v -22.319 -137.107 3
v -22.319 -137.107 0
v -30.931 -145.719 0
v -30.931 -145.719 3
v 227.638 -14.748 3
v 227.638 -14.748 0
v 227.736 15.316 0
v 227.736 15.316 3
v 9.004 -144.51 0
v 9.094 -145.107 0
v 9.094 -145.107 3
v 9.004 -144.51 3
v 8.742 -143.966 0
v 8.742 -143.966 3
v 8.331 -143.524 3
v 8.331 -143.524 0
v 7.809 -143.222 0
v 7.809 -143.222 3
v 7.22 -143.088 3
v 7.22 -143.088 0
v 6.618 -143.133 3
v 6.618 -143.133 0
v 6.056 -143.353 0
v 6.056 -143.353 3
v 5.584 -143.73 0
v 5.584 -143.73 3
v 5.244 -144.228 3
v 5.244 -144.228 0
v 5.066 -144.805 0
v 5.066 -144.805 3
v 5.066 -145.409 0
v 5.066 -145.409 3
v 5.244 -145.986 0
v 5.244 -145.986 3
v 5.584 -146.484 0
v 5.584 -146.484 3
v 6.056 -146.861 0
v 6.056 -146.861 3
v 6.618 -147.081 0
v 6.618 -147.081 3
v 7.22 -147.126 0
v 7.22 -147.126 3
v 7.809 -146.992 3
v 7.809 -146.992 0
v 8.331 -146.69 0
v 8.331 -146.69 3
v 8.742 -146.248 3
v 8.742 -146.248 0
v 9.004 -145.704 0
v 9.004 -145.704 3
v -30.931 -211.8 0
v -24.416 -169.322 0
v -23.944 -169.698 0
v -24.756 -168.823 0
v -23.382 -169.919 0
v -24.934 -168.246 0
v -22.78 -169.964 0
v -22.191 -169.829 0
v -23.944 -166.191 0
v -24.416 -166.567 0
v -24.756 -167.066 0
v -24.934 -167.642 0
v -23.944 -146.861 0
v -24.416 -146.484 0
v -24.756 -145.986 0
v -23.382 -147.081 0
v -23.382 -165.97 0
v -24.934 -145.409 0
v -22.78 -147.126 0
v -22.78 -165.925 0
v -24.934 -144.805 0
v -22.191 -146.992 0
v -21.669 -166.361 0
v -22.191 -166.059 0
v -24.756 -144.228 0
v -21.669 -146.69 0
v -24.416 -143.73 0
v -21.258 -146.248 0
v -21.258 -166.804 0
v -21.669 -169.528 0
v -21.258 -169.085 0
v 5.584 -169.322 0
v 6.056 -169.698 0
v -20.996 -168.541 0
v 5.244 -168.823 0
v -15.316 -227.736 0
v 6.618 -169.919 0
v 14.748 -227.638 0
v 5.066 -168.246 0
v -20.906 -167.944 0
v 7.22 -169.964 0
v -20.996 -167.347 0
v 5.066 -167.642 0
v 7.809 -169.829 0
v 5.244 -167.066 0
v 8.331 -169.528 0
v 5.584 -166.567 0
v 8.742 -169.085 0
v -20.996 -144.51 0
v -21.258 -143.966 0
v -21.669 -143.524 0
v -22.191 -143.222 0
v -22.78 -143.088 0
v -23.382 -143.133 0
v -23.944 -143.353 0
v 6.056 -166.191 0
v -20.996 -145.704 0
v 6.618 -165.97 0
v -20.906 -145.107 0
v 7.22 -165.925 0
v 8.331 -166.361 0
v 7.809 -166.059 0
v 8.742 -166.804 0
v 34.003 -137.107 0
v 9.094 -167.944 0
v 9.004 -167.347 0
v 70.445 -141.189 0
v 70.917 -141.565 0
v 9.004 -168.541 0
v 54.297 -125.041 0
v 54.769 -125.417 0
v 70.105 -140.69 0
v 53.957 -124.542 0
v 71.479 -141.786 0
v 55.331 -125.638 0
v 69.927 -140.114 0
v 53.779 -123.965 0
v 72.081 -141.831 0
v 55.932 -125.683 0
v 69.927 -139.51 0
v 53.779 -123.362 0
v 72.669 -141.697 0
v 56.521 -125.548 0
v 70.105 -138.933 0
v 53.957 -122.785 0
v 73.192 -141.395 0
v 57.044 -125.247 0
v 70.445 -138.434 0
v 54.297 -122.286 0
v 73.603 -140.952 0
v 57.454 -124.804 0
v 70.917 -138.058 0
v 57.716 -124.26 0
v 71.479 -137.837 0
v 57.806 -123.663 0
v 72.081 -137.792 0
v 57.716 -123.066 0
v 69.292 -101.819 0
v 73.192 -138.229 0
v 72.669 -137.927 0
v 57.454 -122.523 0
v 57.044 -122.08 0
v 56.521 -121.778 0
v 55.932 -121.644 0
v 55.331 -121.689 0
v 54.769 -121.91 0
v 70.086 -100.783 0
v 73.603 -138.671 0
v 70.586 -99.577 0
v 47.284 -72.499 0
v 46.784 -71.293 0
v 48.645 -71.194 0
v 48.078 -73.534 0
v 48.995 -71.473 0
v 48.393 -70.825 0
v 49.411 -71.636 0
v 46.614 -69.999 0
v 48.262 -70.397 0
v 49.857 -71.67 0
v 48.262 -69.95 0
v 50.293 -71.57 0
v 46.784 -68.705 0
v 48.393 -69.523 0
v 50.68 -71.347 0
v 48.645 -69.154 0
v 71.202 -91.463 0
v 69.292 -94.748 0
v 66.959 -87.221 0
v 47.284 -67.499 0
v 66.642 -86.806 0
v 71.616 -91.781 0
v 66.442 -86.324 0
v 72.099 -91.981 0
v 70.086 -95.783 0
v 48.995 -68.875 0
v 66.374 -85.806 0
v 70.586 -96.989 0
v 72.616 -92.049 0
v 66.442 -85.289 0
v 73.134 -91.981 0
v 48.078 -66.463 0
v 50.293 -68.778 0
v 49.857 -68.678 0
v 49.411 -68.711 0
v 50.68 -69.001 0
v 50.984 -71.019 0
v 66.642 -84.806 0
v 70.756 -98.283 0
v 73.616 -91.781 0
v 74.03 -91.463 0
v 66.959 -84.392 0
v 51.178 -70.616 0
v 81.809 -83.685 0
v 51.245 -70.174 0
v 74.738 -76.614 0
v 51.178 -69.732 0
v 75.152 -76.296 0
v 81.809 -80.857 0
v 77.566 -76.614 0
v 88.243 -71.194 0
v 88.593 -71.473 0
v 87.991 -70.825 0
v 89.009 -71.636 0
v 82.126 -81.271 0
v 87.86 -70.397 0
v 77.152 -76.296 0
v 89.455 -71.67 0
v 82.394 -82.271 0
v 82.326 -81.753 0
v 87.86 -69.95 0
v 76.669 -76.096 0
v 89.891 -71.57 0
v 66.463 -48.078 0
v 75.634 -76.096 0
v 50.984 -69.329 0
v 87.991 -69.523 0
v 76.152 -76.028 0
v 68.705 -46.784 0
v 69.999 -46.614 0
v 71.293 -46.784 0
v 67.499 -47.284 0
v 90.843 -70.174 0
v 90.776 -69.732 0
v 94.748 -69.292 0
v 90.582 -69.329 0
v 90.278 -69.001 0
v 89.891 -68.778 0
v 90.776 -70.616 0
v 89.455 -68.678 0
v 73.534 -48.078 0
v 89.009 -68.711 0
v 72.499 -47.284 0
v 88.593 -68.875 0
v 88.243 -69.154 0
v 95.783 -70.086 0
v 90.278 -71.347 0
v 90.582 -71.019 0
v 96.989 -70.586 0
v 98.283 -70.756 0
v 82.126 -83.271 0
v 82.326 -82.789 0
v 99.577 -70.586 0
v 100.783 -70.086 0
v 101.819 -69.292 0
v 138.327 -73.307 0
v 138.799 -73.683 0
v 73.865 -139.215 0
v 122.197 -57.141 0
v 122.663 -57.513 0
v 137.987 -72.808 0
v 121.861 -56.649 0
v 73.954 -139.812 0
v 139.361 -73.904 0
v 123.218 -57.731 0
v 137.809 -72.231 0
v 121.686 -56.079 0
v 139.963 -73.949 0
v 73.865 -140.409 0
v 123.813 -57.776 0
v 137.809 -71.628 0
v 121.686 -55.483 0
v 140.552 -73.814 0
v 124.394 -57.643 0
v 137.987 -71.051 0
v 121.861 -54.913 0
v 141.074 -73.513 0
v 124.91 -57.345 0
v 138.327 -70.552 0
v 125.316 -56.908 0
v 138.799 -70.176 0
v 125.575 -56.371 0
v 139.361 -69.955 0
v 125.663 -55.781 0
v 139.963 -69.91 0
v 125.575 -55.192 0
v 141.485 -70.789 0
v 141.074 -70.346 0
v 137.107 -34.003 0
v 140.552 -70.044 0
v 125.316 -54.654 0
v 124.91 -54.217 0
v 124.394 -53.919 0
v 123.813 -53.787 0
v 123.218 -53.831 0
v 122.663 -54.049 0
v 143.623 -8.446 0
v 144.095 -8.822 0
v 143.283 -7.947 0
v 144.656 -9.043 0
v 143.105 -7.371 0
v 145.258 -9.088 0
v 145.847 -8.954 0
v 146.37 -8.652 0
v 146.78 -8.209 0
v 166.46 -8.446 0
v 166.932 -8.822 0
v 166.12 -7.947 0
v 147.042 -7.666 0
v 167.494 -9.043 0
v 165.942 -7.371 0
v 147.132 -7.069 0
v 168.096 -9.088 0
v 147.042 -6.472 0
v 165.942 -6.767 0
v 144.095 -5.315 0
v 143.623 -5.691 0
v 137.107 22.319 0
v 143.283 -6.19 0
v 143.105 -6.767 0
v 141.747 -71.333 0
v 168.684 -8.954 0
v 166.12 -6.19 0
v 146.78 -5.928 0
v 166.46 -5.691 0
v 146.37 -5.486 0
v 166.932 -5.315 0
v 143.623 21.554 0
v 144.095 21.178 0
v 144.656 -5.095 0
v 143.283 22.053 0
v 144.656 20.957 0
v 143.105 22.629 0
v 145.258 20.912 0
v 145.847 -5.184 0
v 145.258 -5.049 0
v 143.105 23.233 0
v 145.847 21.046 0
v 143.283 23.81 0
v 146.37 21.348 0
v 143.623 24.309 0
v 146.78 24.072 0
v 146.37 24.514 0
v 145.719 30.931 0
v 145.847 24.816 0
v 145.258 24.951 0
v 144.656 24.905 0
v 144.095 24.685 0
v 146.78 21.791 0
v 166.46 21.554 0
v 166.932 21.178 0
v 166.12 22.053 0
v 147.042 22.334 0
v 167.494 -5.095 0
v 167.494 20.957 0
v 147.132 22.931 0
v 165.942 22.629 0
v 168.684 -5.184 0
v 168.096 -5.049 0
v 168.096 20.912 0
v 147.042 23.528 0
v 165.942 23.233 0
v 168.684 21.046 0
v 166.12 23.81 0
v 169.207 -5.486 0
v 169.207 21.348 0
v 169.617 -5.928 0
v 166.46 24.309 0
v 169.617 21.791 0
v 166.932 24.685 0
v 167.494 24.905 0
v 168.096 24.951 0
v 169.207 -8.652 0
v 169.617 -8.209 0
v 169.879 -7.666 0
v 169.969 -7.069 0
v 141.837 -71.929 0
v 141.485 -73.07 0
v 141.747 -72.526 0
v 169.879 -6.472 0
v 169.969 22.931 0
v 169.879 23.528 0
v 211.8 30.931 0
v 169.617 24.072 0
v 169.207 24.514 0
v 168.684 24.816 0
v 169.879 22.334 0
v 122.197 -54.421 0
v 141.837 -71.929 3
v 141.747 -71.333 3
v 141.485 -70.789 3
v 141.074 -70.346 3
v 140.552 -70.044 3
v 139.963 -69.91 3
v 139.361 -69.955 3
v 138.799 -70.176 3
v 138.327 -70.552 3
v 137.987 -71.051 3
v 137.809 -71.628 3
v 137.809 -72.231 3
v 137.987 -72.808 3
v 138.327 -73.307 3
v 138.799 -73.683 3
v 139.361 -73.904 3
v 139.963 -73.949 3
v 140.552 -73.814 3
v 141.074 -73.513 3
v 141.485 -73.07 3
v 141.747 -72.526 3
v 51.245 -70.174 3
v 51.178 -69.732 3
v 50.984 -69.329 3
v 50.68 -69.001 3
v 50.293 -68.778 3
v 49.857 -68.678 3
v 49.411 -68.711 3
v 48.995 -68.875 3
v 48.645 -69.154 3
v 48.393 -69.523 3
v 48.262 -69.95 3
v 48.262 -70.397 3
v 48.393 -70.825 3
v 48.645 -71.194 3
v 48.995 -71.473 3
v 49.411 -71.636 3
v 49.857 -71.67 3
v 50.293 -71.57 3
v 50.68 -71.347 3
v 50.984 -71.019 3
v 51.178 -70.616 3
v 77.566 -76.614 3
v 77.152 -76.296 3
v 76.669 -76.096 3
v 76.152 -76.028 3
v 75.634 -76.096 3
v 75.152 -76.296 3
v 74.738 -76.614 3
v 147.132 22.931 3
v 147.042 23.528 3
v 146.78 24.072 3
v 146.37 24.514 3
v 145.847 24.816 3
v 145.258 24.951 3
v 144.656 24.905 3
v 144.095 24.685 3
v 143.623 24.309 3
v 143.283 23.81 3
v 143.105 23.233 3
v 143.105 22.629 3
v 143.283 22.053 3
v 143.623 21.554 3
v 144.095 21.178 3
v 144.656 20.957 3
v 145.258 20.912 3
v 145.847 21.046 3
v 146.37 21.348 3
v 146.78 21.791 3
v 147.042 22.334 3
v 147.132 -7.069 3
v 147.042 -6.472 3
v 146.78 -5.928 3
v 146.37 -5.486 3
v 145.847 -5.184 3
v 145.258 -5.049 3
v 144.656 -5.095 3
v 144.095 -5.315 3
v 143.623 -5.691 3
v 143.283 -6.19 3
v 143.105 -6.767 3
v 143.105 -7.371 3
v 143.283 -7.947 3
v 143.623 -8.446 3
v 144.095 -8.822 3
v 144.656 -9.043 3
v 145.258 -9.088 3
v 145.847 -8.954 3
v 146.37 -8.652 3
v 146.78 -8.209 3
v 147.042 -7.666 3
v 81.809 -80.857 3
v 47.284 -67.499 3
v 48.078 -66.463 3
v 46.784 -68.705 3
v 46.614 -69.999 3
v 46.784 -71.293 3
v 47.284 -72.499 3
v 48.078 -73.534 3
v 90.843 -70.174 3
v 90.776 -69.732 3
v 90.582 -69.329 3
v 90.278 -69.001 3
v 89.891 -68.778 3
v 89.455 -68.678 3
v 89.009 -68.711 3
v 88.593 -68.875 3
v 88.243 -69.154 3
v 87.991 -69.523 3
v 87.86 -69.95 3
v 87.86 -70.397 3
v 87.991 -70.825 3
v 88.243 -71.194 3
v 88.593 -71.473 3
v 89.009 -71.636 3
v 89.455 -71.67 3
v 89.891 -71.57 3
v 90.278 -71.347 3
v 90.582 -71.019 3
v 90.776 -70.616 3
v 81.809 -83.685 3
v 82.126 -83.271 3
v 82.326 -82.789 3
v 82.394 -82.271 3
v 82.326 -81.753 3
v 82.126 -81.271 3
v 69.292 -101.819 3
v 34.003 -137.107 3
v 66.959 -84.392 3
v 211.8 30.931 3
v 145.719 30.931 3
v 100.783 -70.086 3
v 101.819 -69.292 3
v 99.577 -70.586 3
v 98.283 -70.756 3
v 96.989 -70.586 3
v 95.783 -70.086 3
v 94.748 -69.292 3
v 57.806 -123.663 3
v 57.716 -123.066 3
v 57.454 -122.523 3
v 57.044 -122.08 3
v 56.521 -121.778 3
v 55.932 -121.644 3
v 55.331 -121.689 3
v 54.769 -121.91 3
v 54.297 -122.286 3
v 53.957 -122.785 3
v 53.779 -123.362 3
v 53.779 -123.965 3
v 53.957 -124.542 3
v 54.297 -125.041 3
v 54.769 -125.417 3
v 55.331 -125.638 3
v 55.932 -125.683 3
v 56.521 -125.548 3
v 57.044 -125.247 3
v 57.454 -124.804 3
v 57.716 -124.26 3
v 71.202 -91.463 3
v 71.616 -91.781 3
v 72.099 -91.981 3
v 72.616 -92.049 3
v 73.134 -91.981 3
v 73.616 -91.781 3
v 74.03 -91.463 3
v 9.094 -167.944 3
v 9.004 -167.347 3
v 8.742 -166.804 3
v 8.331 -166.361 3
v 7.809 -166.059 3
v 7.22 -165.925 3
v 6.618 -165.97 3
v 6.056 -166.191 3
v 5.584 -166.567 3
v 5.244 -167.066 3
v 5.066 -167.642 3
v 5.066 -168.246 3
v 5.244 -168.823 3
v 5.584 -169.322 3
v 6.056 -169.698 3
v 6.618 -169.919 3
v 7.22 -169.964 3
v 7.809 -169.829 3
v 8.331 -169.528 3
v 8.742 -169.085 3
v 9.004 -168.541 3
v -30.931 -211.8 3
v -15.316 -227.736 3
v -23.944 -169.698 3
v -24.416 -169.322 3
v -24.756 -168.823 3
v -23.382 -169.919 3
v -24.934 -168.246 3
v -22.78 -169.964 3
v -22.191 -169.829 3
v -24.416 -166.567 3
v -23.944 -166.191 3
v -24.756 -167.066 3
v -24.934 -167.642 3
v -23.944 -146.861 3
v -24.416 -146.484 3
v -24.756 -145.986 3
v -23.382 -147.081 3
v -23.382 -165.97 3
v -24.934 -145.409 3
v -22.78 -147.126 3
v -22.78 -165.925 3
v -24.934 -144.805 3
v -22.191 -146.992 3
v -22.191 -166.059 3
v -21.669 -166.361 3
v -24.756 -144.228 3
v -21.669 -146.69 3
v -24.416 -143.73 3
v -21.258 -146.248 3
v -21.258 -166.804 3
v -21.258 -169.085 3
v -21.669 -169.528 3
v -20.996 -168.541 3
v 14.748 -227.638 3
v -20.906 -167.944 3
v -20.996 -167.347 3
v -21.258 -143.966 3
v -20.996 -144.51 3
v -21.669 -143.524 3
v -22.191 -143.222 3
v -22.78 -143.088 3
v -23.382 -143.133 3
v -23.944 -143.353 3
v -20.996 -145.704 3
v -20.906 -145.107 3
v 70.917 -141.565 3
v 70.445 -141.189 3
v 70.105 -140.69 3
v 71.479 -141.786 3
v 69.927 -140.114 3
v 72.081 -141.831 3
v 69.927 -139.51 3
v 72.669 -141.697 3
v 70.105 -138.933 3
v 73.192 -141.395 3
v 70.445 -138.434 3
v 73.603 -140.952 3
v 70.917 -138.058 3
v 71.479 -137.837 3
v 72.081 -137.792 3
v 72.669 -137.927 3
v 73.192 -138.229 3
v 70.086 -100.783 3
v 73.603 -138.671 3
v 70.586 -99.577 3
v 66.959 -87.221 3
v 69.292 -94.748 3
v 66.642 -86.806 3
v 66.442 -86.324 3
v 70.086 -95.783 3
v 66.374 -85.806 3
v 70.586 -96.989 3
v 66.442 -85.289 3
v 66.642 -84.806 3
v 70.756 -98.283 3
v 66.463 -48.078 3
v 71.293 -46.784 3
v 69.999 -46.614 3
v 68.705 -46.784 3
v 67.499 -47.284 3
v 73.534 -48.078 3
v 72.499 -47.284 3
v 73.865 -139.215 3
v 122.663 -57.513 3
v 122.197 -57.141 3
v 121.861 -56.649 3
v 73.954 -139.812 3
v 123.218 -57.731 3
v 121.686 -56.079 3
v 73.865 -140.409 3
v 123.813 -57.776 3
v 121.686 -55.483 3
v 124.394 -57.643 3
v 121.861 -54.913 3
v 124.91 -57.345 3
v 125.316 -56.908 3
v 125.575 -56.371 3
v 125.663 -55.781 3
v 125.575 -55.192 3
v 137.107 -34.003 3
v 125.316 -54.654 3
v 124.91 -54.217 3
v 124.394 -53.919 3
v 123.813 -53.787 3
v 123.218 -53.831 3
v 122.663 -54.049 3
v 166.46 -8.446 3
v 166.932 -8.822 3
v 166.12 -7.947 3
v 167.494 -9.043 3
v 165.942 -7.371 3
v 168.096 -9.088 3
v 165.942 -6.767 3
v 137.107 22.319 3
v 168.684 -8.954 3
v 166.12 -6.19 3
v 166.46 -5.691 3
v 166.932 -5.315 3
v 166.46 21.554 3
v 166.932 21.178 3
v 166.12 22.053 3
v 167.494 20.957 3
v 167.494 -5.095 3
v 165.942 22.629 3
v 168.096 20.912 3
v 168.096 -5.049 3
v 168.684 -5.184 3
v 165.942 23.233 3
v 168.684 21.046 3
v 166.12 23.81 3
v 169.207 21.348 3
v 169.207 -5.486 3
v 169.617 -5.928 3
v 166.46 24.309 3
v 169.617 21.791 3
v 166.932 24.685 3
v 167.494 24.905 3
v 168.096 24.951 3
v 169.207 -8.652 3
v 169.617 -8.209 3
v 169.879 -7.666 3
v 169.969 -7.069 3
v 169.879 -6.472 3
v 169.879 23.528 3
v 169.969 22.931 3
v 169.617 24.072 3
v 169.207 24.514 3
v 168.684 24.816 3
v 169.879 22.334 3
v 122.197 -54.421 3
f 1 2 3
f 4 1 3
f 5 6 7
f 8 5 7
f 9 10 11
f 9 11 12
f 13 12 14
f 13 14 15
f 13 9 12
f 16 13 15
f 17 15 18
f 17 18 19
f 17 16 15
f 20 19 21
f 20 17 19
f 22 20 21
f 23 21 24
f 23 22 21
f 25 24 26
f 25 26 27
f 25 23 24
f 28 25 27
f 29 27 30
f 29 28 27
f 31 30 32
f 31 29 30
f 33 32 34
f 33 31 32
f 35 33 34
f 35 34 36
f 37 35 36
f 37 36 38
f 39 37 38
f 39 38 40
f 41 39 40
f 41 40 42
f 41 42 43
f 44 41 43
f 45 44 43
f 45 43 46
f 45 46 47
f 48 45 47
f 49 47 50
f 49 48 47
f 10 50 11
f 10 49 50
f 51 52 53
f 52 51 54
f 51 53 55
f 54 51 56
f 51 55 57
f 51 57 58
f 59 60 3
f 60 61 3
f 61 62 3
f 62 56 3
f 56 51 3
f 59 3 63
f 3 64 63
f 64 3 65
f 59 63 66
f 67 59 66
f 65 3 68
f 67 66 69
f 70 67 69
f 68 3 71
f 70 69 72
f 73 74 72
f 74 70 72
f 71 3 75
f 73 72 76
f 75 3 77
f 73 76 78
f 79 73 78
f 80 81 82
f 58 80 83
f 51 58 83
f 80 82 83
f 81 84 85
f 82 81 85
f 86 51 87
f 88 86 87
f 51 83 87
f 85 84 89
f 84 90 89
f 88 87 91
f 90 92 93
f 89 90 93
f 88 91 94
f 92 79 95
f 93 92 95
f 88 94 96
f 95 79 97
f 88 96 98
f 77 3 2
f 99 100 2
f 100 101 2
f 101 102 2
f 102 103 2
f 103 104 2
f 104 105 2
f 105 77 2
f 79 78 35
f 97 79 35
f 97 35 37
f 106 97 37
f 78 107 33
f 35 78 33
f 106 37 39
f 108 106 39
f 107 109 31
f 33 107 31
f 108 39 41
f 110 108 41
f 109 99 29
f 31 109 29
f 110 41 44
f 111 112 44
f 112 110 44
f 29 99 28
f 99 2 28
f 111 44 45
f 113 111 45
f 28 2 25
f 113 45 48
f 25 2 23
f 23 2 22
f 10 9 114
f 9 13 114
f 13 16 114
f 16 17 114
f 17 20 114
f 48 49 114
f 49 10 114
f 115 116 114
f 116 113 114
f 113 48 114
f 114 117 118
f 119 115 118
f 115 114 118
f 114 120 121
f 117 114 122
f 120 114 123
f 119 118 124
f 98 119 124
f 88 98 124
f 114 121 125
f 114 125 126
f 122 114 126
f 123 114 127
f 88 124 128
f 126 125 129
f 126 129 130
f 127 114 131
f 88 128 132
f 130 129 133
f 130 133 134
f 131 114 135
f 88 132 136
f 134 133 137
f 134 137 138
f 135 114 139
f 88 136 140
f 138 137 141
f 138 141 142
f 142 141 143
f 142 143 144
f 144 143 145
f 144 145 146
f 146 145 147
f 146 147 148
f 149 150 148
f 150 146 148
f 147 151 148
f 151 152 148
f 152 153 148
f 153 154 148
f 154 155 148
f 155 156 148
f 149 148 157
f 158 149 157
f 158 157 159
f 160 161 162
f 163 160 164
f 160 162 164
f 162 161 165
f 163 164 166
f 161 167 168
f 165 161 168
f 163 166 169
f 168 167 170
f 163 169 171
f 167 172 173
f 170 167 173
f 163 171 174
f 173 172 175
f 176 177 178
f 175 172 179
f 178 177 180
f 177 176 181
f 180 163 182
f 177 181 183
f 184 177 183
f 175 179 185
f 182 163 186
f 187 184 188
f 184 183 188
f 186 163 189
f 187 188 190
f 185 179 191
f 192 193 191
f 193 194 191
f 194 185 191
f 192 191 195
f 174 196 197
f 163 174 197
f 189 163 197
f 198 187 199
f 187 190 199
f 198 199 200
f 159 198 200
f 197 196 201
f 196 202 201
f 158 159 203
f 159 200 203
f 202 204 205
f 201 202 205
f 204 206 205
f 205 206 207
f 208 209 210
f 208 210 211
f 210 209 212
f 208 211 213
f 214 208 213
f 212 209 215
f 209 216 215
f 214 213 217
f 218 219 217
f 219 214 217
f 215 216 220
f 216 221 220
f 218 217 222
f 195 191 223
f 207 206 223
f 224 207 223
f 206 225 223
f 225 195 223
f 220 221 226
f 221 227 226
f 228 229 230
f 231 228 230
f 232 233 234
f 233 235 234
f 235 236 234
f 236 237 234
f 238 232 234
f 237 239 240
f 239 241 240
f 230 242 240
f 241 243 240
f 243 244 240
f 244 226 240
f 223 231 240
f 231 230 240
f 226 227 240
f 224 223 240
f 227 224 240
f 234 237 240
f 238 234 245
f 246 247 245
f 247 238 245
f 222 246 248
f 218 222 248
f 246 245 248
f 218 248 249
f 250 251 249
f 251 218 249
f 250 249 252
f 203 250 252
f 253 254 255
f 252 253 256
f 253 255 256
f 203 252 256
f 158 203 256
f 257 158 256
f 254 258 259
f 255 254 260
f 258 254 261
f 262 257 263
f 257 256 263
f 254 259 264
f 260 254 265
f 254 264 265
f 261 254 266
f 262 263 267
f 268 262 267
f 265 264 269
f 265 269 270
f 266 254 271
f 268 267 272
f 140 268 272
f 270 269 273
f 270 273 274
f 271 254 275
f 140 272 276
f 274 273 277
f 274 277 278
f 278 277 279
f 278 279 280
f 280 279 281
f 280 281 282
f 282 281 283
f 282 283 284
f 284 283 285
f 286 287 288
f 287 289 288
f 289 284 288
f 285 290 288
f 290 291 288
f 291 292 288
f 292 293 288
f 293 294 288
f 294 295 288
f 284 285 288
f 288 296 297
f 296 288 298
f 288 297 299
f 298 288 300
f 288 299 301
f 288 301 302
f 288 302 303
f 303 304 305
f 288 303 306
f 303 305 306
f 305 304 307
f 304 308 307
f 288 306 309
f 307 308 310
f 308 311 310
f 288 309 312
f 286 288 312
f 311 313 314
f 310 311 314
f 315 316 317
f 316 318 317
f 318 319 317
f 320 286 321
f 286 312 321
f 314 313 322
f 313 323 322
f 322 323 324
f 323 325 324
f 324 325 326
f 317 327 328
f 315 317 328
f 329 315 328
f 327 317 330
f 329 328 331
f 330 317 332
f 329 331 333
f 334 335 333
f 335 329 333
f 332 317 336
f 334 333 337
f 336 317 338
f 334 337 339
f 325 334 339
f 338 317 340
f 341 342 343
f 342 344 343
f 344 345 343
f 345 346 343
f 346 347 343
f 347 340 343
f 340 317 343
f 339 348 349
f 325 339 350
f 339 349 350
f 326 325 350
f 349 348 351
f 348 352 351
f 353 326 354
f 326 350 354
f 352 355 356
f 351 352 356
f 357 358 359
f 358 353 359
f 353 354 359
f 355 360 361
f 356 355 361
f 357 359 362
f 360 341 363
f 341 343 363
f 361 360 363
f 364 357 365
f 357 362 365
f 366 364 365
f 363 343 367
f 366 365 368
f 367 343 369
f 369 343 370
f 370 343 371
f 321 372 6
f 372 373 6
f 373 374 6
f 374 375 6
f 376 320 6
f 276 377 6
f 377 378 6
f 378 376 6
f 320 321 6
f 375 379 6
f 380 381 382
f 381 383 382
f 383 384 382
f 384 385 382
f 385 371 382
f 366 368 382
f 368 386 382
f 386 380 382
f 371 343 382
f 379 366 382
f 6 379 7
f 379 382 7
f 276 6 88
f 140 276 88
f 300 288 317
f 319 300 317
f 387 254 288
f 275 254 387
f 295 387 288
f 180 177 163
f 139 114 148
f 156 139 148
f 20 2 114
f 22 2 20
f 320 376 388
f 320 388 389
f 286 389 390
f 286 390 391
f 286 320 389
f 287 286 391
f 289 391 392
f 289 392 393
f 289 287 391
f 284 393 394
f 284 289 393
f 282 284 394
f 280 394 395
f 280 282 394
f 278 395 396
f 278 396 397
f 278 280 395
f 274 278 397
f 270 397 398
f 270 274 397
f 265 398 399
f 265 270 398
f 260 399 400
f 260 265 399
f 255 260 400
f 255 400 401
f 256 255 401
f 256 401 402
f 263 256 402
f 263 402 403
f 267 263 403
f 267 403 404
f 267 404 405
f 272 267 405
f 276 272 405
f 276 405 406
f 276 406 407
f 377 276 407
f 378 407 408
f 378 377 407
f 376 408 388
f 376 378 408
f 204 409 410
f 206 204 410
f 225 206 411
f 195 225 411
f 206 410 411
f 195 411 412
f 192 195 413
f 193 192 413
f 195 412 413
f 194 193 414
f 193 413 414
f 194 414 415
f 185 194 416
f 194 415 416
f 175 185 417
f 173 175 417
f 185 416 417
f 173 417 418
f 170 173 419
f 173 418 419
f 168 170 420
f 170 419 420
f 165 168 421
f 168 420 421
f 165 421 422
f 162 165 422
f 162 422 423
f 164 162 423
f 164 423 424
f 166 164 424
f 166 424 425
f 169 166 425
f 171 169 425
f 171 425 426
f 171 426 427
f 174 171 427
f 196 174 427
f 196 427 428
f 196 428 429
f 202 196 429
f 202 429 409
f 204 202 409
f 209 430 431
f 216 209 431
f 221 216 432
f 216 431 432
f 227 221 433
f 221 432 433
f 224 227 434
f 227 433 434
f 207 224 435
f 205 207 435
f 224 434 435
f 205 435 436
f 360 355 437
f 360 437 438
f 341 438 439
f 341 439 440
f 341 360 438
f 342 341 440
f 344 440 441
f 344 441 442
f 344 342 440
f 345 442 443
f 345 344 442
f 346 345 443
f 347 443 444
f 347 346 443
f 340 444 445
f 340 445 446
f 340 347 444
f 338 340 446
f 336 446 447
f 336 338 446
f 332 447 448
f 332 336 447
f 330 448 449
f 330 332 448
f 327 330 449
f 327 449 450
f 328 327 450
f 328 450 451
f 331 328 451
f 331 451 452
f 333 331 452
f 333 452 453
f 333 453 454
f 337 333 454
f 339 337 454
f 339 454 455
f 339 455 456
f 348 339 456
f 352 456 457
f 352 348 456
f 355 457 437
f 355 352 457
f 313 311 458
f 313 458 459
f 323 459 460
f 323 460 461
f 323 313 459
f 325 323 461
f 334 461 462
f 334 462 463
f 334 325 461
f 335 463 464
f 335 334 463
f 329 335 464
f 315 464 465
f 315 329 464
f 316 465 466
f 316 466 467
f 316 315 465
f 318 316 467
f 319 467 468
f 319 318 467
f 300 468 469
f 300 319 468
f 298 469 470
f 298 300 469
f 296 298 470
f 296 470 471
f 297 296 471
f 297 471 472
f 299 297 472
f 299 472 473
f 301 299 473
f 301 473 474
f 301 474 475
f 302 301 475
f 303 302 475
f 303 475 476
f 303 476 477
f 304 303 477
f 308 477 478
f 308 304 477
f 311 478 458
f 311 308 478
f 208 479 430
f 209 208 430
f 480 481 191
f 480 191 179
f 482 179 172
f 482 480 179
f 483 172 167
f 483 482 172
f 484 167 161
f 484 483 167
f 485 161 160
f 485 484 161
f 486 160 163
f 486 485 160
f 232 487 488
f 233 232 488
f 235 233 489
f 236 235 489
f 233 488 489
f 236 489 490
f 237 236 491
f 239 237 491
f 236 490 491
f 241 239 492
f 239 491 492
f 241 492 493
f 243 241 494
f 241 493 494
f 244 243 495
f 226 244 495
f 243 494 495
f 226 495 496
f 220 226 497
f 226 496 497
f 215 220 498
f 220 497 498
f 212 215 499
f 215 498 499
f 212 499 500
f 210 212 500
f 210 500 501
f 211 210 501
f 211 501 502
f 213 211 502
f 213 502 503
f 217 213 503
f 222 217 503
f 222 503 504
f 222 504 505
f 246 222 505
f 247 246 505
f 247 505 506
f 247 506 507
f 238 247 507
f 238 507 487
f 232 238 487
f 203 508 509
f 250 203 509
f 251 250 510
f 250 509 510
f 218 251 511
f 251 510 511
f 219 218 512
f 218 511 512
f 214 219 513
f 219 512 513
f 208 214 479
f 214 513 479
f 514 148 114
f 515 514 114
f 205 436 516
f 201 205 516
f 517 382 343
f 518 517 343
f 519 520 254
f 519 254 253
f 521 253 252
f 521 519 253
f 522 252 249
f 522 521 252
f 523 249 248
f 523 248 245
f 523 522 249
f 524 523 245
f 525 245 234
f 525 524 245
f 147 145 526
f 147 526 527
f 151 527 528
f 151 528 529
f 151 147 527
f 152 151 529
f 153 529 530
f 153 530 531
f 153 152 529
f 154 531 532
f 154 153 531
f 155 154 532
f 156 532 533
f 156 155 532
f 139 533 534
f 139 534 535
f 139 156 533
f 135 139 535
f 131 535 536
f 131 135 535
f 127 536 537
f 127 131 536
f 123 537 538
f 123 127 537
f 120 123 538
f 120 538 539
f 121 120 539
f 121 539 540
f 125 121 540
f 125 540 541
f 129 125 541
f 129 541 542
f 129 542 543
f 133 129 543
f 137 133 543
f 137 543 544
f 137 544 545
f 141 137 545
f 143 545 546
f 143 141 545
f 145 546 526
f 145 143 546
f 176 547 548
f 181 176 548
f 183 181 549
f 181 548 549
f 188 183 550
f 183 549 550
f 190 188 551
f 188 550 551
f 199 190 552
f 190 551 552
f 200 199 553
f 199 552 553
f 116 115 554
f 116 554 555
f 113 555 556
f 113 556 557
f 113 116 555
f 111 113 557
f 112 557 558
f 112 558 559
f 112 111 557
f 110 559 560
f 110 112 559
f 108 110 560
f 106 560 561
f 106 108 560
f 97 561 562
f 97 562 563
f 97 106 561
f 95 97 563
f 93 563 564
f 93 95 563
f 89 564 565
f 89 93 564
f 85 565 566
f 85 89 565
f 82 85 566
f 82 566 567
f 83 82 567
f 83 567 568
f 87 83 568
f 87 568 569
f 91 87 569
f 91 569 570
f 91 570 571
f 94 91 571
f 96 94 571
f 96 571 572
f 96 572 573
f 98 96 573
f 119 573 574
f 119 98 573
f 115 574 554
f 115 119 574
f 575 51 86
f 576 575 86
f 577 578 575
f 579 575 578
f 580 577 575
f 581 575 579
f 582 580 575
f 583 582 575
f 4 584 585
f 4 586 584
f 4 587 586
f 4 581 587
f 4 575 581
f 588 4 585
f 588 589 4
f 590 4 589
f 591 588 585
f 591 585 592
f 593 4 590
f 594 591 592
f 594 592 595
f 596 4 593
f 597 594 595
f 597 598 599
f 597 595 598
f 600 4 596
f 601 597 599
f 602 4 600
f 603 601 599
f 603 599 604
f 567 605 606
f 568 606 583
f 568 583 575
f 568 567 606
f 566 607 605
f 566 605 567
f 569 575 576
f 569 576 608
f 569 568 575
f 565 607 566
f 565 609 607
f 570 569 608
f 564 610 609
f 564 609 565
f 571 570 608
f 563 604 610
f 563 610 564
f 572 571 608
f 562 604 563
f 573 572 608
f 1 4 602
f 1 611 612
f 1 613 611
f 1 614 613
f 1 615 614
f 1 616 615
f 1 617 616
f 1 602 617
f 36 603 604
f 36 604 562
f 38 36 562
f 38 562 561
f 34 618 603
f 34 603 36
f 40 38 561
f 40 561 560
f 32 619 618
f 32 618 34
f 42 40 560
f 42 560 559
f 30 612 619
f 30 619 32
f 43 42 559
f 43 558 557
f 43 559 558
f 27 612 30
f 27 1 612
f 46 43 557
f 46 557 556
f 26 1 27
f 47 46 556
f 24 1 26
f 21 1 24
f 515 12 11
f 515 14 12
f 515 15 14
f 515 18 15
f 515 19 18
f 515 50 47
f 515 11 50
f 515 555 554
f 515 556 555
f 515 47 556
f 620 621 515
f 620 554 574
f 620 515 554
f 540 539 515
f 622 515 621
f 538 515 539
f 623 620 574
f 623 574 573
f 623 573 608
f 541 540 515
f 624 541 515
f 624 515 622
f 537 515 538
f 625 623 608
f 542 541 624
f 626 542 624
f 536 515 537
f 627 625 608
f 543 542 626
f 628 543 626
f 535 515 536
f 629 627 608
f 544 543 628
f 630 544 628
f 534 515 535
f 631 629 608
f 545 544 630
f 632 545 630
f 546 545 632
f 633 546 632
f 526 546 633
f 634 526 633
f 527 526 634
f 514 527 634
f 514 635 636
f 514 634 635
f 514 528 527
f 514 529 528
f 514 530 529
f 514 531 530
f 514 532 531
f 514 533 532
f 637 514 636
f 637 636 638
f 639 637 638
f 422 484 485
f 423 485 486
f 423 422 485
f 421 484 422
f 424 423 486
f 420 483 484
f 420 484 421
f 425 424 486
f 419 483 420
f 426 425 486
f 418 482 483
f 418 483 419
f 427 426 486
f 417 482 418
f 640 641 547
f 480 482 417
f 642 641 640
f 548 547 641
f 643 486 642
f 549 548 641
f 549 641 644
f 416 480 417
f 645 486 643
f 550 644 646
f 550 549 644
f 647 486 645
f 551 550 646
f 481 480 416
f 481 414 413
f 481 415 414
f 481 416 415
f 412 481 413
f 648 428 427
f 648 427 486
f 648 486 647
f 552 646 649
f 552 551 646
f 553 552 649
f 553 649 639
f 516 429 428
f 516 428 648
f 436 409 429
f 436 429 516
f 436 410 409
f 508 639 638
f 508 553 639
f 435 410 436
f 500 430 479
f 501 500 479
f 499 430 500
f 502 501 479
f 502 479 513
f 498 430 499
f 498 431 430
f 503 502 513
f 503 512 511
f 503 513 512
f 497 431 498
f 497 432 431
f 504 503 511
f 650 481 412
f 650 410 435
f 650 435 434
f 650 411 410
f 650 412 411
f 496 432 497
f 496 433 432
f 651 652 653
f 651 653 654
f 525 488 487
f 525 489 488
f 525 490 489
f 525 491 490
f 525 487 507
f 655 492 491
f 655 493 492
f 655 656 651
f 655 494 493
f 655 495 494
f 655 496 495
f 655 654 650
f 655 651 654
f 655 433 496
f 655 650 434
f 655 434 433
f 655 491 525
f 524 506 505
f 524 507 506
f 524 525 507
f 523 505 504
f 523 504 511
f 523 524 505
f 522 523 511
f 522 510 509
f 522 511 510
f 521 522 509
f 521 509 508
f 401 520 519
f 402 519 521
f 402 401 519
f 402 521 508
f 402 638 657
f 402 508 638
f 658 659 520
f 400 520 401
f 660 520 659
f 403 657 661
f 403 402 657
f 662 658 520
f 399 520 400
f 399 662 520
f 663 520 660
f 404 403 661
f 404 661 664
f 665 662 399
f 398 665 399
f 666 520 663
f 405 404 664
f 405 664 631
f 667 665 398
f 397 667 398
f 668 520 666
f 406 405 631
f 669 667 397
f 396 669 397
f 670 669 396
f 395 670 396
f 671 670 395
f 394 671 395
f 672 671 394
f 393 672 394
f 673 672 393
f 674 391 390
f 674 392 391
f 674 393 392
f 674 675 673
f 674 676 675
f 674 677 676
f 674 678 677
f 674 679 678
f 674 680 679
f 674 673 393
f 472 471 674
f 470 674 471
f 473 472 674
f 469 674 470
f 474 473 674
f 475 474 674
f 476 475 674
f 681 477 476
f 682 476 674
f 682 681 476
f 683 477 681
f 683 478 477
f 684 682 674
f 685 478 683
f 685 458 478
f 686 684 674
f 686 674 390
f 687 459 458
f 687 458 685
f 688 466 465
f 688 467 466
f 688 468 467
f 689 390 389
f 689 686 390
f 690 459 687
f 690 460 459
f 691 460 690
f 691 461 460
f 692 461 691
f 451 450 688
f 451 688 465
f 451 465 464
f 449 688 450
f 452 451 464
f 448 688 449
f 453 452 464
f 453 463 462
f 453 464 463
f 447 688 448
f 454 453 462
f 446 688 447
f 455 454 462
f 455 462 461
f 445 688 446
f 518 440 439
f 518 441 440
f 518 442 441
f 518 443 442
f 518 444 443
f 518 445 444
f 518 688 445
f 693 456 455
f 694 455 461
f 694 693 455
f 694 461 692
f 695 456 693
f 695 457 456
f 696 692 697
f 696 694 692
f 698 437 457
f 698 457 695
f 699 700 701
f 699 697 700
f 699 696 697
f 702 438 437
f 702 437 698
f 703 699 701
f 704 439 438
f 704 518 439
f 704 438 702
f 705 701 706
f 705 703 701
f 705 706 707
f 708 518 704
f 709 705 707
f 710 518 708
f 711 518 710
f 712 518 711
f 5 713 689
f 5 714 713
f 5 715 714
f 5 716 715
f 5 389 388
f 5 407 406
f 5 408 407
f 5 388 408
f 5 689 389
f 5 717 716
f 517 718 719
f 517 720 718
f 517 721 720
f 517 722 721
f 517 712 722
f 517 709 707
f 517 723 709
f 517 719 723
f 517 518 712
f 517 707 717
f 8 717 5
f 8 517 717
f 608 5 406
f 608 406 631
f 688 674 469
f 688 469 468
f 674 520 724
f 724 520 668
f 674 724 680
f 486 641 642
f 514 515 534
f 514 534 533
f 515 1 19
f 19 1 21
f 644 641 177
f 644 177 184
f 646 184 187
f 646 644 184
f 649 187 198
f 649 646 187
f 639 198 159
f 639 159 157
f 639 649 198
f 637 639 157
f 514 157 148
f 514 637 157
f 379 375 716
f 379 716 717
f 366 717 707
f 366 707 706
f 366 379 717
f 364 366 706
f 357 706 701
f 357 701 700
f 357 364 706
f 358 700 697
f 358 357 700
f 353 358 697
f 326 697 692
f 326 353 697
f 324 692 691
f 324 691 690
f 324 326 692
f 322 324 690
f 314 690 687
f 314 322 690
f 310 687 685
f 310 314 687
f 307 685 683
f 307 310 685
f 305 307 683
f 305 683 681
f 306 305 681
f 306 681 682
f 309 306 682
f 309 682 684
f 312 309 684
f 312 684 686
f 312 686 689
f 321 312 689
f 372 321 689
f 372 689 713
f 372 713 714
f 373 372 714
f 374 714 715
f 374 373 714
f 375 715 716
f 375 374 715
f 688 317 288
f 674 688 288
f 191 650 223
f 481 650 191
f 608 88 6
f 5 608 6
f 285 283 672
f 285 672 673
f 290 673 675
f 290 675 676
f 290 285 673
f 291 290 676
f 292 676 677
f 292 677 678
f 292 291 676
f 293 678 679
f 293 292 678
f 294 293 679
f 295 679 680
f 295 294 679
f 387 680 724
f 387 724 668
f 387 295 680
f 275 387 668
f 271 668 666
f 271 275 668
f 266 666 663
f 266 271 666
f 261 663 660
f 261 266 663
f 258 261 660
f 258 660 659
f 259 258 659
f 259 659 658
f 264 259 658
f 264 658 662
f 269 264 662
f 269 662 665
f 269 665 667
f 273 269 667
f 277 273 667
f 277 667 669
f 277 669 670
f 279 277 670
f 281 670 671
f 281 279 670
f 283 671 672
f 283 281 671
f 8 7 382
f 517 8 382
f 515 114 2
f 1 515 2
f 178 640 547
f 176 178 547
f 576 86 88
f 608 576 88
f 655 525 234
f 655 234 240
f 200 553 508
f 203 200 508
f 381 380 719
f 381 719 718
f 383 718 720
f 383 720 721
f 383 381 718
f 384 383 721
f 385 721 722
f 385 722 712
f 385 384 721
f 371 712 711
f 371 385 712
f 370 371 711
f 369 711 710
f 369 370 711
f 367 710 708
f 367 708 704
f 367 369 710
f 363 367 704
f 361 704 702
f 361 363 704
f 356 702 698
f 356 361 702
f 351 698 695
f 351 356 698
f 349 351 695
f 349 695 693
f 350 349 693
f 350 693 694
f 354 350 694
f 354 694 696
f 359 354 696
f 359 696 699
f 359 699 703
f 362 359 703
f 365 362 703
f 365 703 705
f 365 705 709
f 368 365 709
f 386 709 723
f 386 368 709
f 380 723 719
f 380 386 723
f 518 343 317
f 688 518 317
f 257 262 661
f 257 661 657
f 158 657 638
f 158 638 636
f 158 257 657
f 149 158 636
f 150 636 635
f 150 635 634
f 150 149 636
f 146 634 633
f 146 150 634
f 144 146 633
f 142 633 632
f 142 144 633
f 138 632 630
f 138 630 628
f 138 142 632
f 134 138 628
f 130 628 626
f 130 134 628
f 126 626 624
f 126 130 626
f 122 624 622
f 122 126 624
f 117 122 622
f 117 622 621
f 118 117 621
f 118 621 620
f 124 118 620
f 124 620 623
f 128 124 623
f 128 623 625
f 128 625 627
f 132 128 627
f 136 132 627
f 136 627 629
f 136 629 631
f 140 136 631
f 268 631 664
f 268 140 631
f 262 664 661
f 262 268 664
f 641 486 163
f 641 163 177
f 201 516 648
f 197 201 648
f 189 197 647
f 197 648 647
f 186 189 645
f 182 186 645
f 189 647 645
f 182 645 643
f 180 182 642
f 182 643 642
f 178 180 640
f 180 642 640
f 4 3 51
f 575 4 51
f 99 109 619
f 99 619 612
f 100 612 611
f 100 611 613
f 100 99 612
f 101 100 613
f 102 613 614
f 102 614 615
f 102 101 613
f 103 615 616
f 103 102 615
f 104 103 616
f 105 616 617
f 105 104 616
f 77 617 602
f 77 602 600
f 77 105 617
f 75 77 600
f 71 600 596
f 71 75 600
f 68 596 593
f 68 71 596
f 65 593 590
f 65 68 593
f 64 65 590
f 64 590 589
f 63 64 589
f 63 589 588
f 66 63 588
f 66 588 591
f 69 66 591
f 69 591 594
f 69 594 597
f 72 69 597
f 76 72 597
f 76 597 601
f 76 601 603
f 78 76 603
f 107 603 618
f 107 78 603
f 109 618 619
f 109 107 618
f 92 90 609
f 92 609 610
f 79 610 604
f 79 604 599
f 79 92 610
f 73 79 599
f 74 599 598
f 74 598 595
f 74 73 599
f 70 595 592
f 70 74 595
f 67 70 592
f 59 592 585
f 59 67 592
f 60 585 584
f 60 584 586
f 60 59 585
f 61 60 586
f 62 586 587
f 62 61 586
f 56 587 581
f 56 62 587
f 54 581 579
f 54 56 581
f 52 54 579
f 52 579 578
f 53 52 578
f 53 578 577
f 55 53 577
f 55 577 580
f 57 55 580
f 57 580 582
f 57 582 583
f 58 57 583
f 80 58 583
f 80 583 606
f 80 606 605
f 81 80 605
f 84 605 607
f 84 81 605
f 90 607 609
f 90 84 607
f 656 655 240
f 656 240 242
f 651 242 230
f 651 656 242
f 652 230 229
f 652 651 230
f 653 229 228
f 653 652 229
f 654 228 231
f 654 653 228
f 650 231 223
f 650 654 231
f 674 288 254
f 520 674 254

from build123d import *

# Parameters (mm, degrees)
SKETCH1_R           = 2.025
SKETCH1_R_2         = 2
BOSS_EXTRUDE1_DEPTH = 3
BOSS_EXTRUDE2_DEPTH = 3
SKETCH3_R           = 1.5
CUT_EXTRUDE1_DEPTH  = 323.081088677


with BuildPart() as part:
    # Sketch1 → Boss-Extrude1 (new body)
    with BuildSketch(Plane.XY):
        Polygon((-22.319441397, -137.107072194), (-30.931230202, -145.718860999), (-30.931230202, -211.799971874), (-15.316322, -227.735842242), (14.74833584, -227.638274393), (227.638274393, -14.74833584), (227.735842242, 15.316322), (211.799971874, 30.931230202), (145.718860999, 30.931230202), (137.107072194, 22.319441397), (137.107072194, -34.003174495), (34.003174495, -137.107072194), align=None)
        with Locations((-22.931230202, -167.944306144)):
            Circle(SKETCH1_R, mode=Mode.SUBTRACT)
        with Locations((7.068769798, -167.944306144)):
            Circle(SKETCH1_R, mode=Mode.SUBTRACT)
        with Locations((-22.931230202, -145.107072194)):
            Circle(SKETCH1_R, mode=Mode.SUBTRACT)
        with Locations((7.068769798, -145.107072194)):
            Circle(SKETCH1_R, mode=Mode.SUBTRACT)
        with Locations((71.929470696, -139.81172169)):
            Circle(SKETCH1_R, mode=Mode.SUBTRACT)
        with Locations((55.781107706, -123.6633587)):
            Circle(SKETCH1_R, mode=Mode.SUBTRACT)
        with Locations((167.944306144, 22.931230202)):
            Circle(SKETCH1_R, mode=Mode.SUBTRACT)
        with Locations((139.81172169, -71.929470696)):
            Circle(SKETCH1_R, mode=Mode.SUBTRACT)
        with Locations((145.107072194, -7.068769798)):
            Circle(SKETCH1_R, mode=Mode.SUBTRACT)
        with Locations((145.107072194, 22.931230202)):
            Circle(SKETCH1_R, mode=Mode.SUBTRACT)
        with Locations((167.944306144, -7.068769798)):
            Circle(SKETCH1_R, mode=Mode.SUBTRACT)
        with Locations((123.6633587, -55.781107706)):
            Circle(SKETCH1_R_2, mode=Mode.SUBTRACT)
    extrude(amount=BOSS_EXTRUDE1_DEPTH)

    # Sketch2 → Boss-Extrude2 (add)
    with BuildSketch(Plane.XY.offset(3)):
        with BuildLine():
            Line((66.463240253, -48.078463942), (48.078463942, -66.463240253))
            ThreePointArc((48.078463942, -66.463240253), (46.613997848, -69.998774159), (48.078463942, -73.534308065))
            Line((48.078463942, -73.534308065), (69.291667378, -94.7475115))
            ThreePointArc((69.291667378, -94.7475115), (70.756133472, -98.283045406), (69.291667378, -101.818579312))
            Line((69.291667378, -101.818579312), (72.827201283, -98.283045406))
            Line((72.827201283, -98.283045406), (85.555123345, -85.555123345))
            Line((85.555123345, -85.555123345), (98.283045406, -72.827201283))
            Line((98.283045406, -72.827201283), (101.818579312, -69.291667378))
            ThreePointArc((101.818579312, -69.291667378), (98.283045406, -70.756133472), (94.7475115, -69.291667378))
            Line((94.7475115, -69.291667378), (73.534308065, -48.078463942))
            ThreePointArc((73.534308065, -48.078463942), (69.998774159, -46.613997848), (66.463240253, -48.078463942))
        make_face()
    extrude(amount=-BOSS_EXTRUDE2_DEPTH)

    # Sketch3 → Cut-Extrude1 (cut, through all)
    with BuildSketch(Plane.XY.offset(3)):
        with Locations((49.744824715, -70.173841205)):
            Circle(SKETCH3_R)
        with Locations((89.342804461, -70.173841205)):
            Circle(SKETCH3_R)
        with BuildLine():
            Line((66.95938056, -87.220709483), (71.202021247, -91.46335017))
            ThreePointArc((71.202021247, -91.46335017), (72.61623481, -92.049136607), (74.030448372, -91.46335017))
            Line((74.030448372, -91.46335017), (81.808622965, -83.685175577))
            ThreePointArc((81.808622965, -83.685175577), (82.394409403, -82.270962014), (81.808622965, -80.856748452))
            Line((81.808622965, -80.856748452), (77.565982278, -76.614107765))
            ThreePointArc((77.565982278, -76.614107765), (76.151768716, -76.028321327), (74.737555153, -76.614107765))
            Line((74.737555153, -76.614107765), (66.95938056, -84.392282358))
            ThreePointArc((66.95938056, -84.392282358), (66.373594123, -85.80649592), (66.95938056, -87.220709483))
        make_face()
    extrude(amount=-CUT_EXTRUDE1_DEPTH, mode=Mode.SUBTRACT)


solid = part.part
